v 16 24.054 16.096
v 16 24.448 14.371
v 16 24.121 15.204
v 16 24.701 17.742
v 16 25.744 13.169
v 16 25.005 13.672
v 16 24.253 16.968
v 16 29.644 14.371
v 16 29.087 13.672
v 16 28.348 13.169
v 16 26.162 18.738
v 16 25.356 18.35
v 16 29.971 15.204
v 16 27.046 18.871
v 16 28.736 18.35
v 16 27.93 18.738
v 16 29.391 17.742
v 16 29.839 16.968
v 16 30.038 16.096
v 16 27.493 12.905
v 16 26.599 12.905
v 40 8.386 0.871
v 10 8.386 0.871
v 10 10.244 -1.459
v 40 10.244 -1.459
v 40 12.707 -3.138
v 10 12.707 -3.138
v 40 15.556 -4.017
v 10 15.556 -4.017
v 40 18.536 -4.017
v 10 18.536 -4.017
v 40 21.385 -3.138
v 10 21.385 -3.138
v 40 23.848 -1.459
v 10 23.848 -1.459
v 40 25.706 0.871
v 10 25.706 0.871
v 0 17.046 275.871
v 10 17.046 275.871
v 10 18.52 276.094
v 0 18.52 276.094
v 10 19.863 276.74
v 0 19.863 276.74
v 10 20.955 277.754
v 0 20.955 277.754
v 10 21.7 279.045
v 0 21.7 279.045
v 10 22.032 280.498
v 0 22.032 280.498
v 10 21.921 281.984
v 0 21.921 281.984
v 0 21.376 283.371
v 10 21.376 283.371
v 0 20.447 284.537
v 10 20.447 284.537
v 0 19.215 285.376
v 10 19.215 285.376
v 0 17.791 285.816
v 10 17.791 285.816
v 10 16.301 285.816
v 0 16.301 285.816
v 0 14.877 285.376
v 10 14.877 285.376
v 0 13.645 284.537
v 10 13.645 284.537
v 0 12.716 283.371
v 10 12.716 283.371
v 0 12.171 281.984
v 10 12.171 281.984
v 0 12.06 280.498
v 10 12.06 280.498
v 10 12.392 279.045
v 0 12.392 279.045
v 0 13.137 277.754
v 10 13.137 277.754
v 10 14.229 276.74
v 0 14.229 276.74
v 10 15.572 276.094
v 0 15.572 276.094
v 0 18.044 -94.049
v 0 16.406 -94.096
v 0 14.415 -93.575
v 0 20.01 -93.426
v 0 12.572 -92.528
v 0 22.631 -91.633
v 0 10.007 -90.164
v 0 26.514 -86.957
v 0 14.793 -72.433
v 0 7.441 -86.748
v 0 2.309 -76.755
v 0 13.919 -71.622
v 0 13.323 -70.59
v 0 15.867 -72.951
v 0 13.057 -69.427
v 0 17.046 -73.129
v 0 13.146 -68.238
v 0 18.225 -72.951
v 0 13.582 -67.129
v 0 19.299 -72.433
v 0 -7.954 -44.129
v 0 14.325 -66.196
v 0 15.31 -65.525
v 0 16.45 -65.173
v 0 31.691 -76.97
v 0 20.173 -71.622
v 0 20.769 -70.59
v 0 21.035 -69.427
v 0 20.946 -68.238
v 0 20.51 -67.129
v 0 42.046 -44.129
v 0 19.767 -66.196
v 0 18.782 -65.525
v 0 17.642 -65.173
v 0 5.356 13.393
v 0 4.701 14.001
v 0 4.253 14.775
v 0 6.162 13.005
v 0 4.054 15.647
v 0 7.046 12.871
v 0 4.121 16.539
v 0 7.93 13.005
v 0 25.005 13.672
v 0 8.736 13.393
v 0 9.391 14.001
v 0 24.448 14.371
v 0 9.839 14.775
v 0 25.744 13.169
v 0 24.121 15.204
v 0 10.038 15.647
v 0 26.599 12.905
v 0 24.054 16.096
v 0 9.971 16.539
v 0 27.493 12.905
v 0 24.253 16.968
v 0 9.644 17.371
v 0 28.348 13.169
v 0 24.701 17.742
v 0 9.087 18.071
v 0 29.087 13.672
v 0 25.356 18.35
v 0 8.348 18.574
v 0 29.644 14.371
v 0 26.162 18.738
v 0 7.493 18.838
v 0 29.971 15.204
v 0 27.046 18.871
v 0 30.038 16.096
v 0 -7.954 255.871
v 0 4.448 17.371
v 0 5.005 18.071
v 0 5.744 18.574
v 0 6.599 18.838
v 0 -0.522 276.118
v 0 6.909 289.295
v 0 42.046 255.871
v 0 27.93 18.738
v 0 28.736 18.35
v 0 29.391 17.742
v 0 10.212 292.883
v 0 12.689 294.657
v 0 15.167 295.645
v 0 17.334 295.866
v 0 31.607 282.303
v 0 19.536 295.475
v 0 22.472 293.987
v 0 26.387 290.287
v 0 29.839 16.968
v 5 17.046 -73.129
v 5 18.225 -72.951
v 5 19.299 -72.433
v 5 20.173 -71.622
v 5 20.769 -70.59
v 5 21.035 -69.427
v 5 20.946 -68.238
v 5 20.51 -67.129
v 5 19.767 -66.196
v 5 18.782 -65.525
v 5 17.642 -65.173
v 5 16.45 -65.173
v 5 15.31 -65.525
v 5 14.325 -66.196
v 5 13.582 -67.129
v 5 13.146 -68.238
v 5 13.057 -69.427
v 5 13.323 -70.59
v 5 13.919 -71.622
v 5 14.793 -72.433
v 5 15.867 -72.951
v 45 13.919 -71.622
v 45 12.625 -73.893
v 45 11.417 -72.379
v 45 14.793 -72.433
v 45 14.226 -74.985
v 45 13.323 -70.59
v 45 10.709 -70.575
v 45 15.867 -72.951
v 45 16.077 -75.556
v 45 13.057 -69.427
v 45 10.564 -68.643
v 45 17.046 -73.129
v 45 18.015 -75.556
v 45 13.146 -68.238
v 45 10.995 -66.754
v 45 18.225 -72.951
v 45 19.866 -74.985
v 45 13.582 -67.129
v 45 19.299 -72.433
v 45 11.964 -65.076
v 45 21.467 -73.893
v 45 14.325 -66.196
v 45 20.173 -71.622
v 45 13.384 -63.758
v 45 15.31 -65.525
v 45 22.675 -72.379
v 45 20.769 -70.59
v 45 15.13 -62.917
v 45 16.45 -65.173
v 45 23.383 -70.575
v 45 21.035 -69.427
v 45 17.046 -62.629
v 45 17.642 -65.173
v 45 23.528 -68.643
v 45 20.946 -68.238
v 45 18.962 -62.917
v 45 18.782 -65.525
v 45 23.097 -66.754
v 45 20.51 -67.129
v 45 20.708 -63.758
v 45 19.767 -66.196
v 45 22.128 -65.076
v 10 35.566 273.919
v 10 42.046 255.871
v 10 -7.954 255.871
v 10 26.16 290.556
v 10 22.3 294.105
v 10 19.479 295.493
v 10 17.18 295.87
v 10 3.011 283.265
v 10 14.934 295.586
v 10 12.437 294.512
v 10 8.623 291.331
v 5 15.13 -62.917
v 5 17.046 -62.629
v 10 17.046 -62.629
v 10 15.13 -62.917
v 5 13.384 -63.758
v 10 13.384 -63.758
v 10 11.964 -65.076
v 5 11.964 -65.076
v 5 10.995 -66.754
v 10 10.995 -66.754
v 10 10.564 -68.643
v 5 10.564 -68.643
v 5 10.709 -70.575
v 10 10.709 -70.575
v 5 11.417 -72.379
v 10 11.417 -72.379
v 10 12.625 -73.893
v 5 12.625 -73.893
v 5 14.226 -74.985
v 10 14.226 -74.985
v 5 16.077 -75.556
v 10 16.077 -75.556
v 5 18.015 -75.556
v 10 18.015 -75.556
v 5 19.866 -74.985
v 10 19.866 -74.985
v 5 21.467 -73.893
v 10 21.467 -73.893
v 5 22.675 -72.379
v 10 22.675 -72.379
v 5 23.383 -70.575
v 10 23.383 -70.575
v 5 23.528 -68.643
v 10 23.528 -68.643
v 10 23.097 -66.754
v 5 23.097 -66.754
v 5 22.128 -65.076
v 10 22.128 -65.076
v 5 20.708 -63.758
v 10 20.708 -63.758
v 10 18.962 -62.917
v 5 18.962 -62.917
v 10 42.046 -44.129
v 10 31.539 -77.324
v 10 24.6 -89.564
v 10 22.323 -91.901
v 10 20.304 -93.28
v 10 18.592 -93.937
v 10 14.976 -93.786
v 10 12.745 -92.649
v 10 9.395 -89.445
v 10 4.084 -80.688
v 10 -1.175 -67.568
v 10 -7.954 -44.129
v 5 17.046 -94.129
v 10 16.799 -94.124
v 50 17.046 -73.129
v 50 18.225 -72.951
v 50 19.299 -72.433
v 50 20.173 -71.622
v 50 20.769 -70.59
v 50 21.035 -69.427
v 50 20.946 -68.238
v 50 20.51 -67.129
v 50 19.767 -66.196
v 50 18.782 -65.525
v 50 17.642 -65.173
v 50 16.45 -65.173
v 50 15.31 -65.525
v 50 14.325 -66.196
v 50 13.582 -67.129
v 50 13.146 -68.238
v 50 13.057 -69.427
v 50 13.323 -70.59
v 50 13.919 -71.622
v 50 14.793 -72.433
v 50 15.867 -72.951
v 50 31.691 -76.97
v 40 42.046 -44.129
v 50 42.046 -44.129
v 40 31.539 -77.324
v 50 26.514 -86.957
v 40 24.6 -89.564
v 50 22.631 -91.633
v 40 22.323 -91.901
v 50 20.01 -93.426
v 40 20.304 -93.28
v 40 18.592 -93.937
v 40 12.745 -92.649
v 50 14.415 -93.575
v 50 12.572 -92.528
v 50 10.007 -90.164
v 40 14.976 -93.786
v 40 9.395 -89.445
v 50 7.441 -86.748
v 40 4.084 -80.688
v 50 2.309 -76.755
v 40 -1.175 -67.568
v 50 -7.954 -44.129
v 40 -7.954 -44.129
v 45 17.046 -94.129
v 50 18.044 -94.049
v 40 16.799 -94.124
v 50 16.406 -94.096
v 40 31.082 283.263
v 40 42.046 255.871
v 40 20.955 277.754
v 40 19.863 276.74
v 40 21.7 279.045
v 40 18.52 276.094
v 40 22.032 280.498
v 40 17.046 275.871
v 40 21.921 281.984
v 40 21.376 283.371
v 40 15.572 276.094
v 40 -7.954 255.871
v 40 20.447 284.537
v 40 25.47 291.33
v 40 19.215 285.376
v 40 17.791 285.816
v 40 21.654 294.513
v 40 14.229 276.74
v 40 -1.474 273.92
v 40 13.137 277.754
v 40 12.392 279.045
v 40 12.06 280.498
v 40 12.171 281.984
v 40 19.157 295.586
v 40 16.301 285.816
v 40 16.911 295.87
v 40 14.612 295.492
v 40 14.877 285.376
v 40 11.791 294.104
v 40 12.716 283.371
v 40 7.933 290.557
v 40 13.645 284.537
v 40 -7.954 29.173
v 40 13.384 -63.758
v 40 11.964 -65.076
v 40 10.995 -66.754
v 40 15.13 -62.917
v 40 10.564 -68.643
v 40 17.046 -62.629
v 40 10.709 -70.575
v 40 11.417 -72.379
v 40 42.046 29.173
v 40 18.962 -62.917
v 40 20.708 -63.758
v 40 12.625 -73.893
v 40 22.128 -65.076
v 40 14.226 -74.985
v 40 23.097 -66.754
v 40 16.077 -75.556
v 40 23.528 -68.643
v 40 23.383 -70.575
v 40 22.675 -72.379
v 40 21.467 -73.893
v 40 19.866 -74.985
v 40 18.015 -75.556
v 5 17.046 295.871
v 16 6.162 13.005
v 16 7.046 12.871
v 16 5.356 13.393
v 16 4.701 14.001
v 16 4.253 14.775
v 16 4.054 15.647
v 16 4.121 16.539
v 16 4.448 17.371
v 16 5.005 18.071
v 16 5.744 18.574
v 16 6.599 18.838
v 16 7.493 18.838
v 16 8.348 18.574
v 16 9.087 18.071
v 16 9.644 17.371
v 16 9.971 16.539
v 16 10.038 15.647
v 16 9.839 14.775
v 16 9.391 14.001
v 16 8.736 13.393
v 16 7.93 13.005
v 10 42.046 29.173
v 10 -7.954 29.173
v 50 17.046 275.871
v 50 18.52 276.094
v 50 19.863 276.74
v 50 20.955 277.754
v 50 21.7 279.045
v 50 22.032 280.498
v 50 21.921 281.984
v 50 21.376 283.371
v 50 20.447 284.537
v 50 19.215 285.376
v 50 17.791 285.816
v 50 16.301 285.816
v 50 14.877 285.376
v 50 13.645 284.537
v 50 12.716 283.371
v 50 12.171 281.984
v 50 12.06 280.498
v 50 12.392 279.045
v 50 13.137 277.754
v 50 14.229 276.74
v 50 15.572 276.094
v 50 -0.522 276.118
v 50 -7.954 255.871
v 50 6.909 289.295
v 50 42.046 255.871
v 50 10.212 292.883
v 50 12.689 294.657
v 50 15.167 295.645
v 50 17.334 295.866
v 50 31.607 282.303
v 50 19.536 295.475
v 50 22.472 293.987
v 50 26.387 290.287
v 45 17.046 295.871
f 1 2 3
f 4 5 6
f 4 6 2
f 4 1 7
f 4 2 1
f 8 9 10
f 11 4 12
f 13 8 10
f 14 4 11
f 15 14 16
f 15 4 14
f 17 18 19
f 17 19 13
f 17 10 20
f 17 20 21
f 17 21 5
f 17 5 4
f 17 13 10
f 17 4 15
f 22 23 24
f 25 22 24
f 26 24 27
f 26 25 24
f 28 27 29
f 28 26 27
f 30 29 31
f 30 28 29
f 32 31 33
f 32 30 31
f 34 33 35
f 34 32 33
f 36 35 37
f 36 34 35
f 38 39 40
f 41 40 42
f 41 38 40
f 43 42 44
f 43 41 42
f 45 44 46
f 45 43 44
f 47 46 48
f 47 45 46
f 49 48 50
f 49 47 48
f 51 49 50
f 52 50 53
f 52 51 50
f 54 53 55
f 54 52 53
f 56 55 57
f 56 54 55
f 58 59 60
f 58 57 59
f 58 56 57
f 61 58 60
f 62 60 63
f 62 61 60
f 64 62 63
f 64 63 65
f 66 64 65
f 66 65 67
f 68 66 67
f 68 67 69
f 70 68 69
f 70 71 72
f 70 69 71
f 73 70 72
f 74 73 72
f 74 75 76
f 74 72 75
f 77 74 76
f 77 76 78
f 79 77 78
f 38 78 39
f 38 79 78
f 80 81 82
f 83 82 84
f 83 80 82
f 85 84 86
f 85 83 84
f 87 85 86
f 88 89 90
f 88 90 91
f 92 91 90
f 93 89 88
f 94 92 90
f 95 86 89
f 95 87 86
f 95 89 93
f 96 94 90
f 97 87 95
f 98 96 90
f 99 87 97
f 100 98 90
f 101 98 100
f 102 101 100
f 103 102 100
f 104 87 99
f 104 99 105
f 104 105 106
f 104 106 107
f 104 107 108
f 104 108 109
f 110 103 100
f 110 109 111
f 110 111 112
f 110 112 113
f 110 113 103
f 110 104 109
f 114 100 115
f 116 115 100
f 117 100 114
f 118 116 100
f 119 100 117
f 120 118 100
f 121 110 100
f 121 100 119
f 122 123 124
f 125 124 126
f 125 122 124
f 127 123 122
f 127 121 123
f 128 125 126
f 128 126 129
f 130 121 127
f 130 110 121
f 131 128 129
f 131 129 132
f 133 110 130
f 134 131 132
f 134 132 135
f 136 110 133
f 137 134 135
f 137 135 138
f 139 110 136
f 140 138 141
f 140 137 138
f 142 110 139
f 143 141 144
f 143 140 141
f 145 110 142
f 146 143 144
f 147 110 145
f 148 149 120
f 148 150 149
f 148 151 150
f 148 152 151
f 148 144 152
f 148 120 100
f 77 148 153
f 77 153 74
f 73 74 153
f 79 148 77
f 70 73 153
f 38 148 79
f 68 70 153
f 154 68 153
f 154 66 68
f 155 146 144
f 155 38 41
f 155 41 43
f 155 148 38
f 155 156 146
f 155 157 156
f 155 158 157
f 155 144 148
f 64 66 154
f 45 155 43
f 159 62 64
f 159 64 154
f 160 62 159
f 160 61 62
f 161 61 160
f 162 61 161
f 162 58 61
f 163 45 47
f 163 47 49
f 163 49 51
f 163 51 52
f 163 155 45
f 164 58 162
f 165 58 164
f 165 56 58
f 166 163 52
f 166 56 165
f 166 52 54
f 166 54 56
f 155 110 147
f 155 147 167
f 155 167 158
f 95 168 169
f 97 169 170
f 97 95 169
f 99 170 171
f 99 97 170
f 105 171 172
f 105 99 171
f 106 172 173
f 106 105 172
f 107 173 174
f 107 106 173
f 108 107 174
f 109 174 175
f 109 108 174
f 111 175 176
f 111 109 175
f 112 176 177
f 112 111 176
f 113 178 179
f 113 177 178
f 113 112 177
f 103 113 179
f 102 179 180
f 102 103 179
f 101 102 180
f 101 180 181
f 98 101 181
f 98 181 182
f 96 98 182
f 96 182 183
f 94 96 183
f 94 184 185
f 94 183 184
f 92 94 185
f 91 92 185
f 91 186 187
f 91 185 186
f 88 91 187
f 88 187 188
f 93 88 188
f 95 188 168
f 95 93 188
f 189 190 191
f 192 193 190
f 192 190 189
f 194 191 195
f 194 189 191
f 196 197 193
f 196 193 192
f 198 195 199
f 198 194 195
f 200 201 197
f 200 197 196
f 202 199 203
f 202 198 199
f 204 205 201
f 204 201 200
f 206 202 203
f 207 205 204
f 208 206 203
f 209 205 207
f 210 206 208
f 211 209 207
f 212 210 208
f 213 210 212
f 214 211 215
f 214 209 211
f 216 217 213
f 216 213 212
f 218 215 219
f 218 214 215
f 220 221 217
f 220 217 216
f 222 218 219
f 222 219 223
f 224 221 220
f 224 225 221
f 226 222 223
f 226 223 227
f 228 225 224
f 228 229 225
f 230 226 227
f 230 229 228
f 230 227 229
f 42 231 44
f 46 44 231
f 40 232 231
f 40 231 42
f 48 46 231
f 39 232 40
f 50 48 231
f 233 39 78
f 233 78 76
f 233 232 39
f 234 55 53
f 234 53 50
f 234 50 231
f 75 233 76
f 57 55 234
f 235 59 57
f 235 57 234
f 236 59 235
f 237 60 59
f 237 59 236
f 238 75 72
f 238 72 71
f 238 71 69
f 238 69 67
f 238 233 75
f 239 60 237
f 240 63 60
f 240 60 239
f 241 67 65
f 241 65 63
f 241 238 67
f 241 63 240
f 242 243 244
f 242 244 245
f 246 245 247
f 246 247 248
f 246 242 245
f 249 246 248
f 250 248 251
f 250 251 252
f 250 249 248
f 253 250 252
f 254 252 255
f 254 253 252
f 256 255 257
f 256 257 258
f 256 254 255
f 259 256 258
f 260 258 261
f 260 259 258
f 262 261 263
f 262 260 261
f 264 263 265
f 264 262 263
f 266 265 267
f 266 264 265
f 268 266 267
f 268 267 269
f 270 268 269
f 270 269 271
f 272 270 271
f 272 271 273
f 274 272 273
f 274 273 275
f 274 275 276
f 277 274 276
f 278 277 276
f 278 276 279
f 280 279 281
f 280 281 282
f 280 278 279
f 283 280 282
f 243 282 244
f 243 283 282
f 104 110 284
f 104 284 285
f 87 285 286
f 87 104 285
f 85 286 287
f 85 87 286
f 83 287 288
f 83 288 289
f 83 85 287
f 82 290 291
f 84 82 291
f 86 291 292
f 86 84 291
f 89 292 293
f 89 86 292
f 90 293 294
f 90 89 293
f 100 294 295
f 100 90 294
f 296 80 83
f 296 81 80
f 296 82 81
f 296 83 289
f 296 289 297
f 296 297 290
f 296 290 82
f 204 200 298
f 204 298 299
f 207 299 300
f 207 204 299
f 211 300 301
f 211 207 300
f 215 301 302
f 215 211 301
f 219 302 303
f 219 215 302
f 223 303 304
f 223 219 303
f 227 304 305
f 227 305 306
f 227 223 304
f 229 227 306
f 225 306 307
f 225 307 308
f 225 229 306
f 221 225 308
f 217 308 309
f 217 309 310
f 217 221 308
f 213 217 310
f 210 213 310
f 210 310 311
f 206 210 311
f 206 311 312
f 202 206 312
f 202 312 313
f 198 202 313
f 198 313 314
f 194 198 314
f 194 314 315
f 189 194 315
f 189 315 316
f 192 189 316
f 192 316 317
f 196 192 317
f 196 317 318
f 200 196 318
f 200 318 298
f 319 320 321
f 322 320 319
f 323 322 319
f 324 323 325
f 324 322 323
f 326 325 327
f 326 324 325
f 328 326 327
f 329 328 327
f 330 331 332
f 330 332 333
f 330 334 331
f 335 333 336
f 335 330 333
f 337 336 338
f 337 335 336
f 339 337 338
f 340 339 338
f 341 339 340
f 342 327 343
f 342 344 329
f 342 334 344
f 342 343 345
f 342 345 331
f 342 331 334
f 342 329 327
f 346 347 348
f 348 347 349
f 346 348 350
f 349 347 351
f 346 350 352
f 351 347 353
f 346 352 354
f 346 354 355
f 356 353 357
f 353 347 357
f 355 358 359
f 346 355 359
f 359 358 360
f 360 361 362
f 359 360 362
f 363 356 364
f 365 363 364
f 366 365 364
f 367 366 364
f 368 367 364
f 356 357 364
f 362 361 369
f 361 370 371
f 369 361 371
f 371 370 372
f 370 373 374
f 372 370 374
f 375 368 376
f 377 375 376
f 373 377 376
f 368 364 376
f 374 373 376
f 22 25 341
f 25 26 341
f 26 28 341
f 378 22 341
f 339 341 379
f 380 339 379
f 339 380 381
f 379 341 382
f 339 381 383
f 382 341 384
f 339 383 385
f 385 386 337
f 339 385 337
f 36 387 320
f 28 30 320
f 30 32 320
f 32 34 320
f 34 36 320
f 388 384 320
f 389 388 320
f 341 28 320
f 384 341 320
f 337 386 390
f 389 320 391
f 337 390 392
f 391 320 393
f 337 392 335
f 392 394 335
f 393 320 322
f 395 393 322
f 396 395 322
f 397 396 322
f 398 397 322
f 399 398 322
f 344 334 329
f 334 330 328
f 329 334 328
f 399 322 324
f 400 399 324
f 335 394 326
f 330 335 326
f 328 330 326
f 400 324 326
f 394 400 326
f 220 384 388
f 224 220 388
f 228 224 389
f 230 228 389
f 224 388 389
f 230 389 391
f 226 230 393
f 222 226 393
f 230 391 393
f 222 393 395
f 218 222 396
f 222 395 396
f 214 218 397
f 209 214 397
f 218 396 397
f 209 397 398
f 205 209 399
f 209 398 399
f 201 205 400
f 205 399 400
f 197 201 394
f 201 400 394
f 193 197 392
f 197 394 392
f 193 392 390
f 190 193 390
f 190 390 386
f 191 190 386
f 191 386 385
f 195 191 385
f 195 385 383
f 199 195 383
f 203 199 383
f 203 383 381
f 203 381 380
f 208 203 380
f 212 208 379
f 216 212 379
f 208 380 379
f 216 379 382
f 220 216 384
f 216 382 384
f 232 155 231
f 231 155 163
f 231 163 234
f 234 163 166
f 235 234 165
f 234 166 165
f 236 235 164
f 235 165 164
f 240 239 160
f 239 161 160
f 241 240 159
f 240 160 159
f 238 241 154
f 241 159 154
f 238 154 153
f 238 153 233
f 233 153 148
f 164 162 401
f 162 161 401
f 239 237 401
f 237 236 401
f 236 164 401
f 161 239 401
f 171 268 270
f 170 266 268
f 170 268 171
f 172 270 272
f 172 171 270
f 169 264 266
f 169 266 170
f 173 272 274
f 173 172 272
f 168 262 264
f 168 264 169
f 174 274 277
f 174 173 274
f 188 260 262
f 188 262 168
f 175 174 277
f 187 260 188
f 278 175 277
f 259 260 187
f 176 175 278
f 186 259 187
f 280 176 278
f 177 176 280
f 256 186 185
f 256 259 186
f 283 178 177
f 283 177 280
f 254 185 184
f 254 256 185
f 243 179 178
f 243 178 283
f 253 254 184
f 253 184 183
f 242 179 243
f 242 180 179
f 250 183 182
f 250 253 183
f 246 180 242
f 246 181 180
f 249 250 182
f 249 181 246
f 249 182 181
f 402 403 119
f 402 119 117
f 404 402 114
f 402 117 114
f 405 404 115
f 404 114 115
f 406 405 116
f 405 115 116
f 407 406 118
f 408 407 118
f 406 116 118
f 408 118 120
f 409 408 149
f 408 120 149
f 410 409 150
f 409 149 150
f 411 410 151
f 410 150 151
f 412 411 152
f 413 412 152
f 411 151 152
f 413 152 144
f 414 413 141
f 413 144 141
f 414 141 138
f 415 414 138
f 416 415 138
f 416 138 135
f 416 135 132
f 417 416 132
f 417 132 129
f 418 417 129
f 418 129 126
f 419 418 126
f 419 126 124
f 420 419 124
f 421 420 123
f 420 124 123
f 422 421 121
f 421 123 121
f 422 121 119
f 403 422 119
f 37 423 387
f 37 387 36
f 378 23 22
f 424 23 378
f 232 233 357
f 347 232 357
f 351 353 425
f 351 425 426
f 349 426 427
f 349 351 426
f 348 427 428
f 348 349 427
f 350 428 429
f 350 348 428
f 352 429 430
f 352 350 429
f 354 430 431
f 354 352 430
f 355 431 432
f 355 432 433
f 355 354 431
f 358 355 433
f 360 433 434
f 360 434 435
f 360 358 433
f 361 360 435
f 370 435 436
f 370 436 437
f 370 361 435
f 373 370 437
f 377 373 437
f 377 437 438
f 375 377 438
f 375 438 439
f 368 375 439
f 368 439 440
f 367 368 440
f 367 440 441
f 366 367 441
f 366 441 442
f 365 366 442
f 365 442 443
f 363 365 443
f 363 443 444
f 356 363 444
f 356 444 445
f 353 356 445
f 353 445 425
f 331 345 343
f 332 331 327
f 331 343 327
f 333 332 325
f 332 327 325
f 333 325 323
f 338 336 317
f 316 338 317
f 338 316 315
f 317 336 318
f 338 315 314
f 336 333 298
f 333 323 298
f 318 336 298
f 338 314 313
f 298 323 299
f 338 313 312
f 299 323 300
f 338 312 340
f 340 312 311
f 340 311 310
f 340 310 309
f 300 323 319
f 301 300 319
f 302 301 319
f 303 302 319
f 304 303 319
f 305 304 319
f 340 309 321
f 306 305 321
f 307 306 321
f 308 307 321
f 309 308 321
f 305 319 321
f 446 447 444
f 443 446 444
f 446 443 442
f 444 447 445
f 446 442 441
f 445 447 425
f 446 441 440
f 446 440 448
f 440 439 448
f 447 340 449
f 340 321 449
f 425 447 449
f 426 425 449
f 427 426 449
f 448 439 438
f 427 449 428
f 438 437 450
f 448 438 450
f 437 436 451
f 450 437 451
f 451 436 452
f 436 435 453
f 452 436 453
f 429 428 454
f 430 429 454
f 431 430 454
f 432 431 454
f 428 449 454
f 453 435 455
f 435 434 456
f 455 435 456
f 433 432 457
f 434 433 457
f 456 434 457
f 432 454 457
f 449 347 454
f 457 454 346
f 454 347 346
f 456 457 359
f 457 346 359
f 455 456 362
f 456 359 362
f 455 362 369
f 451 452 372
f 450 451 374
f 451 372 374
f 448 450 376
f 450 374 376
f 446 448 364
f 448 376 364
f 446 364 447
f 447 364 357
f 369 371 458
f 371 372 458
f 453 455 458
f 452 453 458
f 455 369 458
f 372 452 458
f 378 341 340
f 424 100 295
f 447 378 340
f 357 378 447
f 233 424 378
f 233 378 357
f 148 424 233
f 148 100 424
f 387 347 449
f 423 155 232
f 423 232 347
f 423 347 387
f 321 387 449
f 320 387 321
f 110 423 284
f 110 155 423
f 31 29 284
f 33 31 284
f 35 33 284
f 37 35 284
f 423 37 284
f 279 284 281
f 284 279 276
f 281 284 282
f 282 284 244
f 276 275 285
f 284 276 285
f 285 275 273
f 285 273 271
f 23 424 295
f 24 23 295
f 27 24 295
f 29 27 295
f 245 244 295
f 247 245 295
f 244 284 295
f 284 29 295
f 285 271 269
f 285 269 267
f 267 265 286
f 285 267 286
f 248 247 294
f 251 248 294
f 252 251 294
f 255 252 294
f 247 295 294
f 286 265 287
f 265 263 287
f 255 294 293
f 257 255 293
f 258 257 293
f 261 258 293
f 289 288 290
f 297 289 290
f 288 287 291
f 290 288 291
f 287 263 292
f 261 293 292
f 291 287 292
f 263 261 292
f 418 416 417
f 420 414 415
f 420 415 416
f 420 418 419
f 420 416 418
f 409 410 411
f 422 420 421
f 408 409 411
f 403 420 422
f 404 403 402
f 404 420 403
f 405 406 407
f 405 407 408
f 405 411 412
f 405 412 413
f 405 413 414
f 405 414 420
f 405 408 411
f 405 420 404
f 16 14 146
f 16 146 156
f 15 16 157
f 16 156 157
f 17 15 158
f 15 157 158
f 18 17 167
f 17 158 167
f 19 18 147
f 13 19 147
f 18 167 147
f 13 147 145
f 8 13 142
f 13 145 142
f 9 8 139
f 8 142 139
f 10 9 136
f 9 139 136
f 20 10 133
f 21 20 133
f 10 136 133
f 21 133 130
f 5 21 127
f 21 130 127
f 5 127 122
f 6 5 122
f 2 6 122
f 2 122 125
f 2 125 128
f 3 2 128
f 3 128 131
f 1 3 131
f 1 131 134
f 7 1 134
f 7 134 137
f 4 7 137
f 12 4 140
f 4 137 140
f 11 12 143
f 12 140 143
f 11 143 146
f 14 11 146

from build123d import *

# Parameters (mm, degrees)
SKETCH1_R               = 5
SKETCH1_R_2             = 4
BOSS_EXTRUDE1_DEPTH     = 50
CUT_EXTRUDE1_DEPTH      = 52
CUT_EXTRUDE1_DEPTH_BACK = 35
SKETCH2_W               = 30
SKETCH2_H               = 80
SKETCH3_W               = 30
SKETCH3_H               = 40
CUT_EXTRUDE2_DEPTH      = 52
CUT_EXTRUDE3_START      = -10
CUT_EXTRUDE3_DEPTH      = 30
CUT_EXTRUDE4_START      = -10
CUT_EXTRUDE4_DEPTH      = 30
FILLET1_R               = 10
SKETCH7_R               = 6.5
CUT_EXTRUDE5_DEPTH      = 5
CUT_EXTRUDE6_START      = -5
SKETCH6_R               = 6.5
CUT_EXTRUDE6_DEPTH      = 5
SKETCH8_R               = 3
CUT_EXTRUDE8_DEPTH      = 16


with BuildPart() as part:
    # Sketch1 → Boss-Extrude1 (new body)
    with BuildSketch(Plane(origin=(0, 0, 0), x_dir=(0, 0, -1), z_dir=(1, 0, 0))):
        with BuildLine():
            Line((-255.87149894, 42.046001407), (44.12850106, 42.046001407))
            add(Edge.make_bspline(
                [(44.12850106, 42.046001407), (144.12850106, 17.046001407), (44.12850106, -7.953998593)],
                knots=[0, 0, 0, 1, 1, 1], degree=2))
            Line((44.12850106, -7.953998593), (-255.87149894, -7.953998593))
            add(Edge.make_bspline(
                [(-255.87149894, 42.046001407), (-335.87149894, 17.046001407), (-255.87149894, -7.953998593)],
                knots=[0, 0, 0, 1, 1, 1], degree=2))
        make_face()
        with Locations((-280.87149894, 17.046001407)):
            Circle(SKETCH1_R, mode=Mode.SUBTRACT)
        with Locations((69.12850106, 17.046001407)):
            Circle(SKETCH1_R_2, mode=Mode.SUBTRACT)
    extrude(amount=BOSS_EXTRUDE1_DEPTH)

    # Sketch2 → Cut-Extrude1 (cut, two sides: drawn at the far end of the back side and taken through both)
    with BuildSketch(Plane(origin=(0, 0, 0), x_dir=(1, 0, 0), z_dir=(0, 1, 0)).offset(-CUT_EXTRUDE1_DEPTH_BACK)):
        with Locations((25, 54.12850106)):
            Rectangle(SKETCH2_W, SKETCH2_H)
    extrude(amount=CUT_EXTRUDE1_DEPTH + CUT_EXTRUDE1_DEPTH_BACK, mode=Mode.SUBTRACT)

    # Sketch3 → Cut-Extrude2 (cut)
    with BuildSketch(Plane.XZ.offset(7.953998593)):
        with Locations((25, 275.87149894)):
            Rectangle(SKETCH3_W, SKETCH3_H)
    extrude(amount=-CUT_EXTRUDE2_DEPTH, mode=Mode.SUBTRACT)

    # Sketch4 → Cut-Extrude3 (cut)
    with BuildSketch(Plane.ZY.offset(CUT_EXTRUDE3_START)):
        Polygon((-14.12850106, 17.046001407), (-14.12850106, 42.046001407), (29.172769129, 42.046001407), align=None)
    extrude(amount=-CUT_EXTRUDE3_DEPTH, mode=Mode.SUBTRACT)

    # Sketch5 → Cut-Extrude4 (cut)
    with BuildSketch(Plane.ZY.offset(CUT_EXTRUDE4_START)):
        Polygon((-14.12850106, -7.953998593), (-14.12850106, 17.046001407), (29.172769129, -7.953998593), align=None)
    extrude(amount=-CUT_EXTRUDE4_DEPTH, mode=Mode.SUBTRACT)

    # Fillet1
    fillet1_edges = [part.edges().sort_by_distance(p)[0] for p in [
        (25, 17.046001407, -14.12850106),
    ]]
    fillet(fillet1_edges, radius=FILLET1_R)

    # Sketch7 → Cut-Extrude5 (cut)
    with BuildSketch(Plane.ZY.offset(-40)):
        with Locations((-69.12850106, 17.046001407)):
            Circle(SKETCH7_R)
    extrude(amount=-CUT_EXTRUDE5_DEPTH, mode=Mode.SUBTRACT)

    # Sketch6 → Cut-Extrude6 (cut)
    with BuildSketch(Plane(origin=(10, 0, 0), x_dir=(0, 0, -1), z_dir=(1, 0, 0)).offset(CUT_EXTRUDE6_START)):
        with Locations(Location((69.12850106, 17.046001407, 0), (0, 0, 180))):
            Circle(SKETCH6_R)
    extrude(amount=CUT_EXTRUDE6_DEPTH, mode=Mode.SUBTRACT)

    # Sketch8 → Cut-Extrude8 (cut)
    with BuildSketch(Plane.ZY):
        with Locations(Location((15.87149894, 7.046001407, 0), (0, 0, 180))):
            Circle(SKETCH8_R)
        with Locations((15.87149894, 27.046001407)):
            Circle(SKETCH8_R)
    extrude(amount=-CUT_EXTRUDE8_DEPTH, mode=Mode.SUBTRACT)


solid = part.part
